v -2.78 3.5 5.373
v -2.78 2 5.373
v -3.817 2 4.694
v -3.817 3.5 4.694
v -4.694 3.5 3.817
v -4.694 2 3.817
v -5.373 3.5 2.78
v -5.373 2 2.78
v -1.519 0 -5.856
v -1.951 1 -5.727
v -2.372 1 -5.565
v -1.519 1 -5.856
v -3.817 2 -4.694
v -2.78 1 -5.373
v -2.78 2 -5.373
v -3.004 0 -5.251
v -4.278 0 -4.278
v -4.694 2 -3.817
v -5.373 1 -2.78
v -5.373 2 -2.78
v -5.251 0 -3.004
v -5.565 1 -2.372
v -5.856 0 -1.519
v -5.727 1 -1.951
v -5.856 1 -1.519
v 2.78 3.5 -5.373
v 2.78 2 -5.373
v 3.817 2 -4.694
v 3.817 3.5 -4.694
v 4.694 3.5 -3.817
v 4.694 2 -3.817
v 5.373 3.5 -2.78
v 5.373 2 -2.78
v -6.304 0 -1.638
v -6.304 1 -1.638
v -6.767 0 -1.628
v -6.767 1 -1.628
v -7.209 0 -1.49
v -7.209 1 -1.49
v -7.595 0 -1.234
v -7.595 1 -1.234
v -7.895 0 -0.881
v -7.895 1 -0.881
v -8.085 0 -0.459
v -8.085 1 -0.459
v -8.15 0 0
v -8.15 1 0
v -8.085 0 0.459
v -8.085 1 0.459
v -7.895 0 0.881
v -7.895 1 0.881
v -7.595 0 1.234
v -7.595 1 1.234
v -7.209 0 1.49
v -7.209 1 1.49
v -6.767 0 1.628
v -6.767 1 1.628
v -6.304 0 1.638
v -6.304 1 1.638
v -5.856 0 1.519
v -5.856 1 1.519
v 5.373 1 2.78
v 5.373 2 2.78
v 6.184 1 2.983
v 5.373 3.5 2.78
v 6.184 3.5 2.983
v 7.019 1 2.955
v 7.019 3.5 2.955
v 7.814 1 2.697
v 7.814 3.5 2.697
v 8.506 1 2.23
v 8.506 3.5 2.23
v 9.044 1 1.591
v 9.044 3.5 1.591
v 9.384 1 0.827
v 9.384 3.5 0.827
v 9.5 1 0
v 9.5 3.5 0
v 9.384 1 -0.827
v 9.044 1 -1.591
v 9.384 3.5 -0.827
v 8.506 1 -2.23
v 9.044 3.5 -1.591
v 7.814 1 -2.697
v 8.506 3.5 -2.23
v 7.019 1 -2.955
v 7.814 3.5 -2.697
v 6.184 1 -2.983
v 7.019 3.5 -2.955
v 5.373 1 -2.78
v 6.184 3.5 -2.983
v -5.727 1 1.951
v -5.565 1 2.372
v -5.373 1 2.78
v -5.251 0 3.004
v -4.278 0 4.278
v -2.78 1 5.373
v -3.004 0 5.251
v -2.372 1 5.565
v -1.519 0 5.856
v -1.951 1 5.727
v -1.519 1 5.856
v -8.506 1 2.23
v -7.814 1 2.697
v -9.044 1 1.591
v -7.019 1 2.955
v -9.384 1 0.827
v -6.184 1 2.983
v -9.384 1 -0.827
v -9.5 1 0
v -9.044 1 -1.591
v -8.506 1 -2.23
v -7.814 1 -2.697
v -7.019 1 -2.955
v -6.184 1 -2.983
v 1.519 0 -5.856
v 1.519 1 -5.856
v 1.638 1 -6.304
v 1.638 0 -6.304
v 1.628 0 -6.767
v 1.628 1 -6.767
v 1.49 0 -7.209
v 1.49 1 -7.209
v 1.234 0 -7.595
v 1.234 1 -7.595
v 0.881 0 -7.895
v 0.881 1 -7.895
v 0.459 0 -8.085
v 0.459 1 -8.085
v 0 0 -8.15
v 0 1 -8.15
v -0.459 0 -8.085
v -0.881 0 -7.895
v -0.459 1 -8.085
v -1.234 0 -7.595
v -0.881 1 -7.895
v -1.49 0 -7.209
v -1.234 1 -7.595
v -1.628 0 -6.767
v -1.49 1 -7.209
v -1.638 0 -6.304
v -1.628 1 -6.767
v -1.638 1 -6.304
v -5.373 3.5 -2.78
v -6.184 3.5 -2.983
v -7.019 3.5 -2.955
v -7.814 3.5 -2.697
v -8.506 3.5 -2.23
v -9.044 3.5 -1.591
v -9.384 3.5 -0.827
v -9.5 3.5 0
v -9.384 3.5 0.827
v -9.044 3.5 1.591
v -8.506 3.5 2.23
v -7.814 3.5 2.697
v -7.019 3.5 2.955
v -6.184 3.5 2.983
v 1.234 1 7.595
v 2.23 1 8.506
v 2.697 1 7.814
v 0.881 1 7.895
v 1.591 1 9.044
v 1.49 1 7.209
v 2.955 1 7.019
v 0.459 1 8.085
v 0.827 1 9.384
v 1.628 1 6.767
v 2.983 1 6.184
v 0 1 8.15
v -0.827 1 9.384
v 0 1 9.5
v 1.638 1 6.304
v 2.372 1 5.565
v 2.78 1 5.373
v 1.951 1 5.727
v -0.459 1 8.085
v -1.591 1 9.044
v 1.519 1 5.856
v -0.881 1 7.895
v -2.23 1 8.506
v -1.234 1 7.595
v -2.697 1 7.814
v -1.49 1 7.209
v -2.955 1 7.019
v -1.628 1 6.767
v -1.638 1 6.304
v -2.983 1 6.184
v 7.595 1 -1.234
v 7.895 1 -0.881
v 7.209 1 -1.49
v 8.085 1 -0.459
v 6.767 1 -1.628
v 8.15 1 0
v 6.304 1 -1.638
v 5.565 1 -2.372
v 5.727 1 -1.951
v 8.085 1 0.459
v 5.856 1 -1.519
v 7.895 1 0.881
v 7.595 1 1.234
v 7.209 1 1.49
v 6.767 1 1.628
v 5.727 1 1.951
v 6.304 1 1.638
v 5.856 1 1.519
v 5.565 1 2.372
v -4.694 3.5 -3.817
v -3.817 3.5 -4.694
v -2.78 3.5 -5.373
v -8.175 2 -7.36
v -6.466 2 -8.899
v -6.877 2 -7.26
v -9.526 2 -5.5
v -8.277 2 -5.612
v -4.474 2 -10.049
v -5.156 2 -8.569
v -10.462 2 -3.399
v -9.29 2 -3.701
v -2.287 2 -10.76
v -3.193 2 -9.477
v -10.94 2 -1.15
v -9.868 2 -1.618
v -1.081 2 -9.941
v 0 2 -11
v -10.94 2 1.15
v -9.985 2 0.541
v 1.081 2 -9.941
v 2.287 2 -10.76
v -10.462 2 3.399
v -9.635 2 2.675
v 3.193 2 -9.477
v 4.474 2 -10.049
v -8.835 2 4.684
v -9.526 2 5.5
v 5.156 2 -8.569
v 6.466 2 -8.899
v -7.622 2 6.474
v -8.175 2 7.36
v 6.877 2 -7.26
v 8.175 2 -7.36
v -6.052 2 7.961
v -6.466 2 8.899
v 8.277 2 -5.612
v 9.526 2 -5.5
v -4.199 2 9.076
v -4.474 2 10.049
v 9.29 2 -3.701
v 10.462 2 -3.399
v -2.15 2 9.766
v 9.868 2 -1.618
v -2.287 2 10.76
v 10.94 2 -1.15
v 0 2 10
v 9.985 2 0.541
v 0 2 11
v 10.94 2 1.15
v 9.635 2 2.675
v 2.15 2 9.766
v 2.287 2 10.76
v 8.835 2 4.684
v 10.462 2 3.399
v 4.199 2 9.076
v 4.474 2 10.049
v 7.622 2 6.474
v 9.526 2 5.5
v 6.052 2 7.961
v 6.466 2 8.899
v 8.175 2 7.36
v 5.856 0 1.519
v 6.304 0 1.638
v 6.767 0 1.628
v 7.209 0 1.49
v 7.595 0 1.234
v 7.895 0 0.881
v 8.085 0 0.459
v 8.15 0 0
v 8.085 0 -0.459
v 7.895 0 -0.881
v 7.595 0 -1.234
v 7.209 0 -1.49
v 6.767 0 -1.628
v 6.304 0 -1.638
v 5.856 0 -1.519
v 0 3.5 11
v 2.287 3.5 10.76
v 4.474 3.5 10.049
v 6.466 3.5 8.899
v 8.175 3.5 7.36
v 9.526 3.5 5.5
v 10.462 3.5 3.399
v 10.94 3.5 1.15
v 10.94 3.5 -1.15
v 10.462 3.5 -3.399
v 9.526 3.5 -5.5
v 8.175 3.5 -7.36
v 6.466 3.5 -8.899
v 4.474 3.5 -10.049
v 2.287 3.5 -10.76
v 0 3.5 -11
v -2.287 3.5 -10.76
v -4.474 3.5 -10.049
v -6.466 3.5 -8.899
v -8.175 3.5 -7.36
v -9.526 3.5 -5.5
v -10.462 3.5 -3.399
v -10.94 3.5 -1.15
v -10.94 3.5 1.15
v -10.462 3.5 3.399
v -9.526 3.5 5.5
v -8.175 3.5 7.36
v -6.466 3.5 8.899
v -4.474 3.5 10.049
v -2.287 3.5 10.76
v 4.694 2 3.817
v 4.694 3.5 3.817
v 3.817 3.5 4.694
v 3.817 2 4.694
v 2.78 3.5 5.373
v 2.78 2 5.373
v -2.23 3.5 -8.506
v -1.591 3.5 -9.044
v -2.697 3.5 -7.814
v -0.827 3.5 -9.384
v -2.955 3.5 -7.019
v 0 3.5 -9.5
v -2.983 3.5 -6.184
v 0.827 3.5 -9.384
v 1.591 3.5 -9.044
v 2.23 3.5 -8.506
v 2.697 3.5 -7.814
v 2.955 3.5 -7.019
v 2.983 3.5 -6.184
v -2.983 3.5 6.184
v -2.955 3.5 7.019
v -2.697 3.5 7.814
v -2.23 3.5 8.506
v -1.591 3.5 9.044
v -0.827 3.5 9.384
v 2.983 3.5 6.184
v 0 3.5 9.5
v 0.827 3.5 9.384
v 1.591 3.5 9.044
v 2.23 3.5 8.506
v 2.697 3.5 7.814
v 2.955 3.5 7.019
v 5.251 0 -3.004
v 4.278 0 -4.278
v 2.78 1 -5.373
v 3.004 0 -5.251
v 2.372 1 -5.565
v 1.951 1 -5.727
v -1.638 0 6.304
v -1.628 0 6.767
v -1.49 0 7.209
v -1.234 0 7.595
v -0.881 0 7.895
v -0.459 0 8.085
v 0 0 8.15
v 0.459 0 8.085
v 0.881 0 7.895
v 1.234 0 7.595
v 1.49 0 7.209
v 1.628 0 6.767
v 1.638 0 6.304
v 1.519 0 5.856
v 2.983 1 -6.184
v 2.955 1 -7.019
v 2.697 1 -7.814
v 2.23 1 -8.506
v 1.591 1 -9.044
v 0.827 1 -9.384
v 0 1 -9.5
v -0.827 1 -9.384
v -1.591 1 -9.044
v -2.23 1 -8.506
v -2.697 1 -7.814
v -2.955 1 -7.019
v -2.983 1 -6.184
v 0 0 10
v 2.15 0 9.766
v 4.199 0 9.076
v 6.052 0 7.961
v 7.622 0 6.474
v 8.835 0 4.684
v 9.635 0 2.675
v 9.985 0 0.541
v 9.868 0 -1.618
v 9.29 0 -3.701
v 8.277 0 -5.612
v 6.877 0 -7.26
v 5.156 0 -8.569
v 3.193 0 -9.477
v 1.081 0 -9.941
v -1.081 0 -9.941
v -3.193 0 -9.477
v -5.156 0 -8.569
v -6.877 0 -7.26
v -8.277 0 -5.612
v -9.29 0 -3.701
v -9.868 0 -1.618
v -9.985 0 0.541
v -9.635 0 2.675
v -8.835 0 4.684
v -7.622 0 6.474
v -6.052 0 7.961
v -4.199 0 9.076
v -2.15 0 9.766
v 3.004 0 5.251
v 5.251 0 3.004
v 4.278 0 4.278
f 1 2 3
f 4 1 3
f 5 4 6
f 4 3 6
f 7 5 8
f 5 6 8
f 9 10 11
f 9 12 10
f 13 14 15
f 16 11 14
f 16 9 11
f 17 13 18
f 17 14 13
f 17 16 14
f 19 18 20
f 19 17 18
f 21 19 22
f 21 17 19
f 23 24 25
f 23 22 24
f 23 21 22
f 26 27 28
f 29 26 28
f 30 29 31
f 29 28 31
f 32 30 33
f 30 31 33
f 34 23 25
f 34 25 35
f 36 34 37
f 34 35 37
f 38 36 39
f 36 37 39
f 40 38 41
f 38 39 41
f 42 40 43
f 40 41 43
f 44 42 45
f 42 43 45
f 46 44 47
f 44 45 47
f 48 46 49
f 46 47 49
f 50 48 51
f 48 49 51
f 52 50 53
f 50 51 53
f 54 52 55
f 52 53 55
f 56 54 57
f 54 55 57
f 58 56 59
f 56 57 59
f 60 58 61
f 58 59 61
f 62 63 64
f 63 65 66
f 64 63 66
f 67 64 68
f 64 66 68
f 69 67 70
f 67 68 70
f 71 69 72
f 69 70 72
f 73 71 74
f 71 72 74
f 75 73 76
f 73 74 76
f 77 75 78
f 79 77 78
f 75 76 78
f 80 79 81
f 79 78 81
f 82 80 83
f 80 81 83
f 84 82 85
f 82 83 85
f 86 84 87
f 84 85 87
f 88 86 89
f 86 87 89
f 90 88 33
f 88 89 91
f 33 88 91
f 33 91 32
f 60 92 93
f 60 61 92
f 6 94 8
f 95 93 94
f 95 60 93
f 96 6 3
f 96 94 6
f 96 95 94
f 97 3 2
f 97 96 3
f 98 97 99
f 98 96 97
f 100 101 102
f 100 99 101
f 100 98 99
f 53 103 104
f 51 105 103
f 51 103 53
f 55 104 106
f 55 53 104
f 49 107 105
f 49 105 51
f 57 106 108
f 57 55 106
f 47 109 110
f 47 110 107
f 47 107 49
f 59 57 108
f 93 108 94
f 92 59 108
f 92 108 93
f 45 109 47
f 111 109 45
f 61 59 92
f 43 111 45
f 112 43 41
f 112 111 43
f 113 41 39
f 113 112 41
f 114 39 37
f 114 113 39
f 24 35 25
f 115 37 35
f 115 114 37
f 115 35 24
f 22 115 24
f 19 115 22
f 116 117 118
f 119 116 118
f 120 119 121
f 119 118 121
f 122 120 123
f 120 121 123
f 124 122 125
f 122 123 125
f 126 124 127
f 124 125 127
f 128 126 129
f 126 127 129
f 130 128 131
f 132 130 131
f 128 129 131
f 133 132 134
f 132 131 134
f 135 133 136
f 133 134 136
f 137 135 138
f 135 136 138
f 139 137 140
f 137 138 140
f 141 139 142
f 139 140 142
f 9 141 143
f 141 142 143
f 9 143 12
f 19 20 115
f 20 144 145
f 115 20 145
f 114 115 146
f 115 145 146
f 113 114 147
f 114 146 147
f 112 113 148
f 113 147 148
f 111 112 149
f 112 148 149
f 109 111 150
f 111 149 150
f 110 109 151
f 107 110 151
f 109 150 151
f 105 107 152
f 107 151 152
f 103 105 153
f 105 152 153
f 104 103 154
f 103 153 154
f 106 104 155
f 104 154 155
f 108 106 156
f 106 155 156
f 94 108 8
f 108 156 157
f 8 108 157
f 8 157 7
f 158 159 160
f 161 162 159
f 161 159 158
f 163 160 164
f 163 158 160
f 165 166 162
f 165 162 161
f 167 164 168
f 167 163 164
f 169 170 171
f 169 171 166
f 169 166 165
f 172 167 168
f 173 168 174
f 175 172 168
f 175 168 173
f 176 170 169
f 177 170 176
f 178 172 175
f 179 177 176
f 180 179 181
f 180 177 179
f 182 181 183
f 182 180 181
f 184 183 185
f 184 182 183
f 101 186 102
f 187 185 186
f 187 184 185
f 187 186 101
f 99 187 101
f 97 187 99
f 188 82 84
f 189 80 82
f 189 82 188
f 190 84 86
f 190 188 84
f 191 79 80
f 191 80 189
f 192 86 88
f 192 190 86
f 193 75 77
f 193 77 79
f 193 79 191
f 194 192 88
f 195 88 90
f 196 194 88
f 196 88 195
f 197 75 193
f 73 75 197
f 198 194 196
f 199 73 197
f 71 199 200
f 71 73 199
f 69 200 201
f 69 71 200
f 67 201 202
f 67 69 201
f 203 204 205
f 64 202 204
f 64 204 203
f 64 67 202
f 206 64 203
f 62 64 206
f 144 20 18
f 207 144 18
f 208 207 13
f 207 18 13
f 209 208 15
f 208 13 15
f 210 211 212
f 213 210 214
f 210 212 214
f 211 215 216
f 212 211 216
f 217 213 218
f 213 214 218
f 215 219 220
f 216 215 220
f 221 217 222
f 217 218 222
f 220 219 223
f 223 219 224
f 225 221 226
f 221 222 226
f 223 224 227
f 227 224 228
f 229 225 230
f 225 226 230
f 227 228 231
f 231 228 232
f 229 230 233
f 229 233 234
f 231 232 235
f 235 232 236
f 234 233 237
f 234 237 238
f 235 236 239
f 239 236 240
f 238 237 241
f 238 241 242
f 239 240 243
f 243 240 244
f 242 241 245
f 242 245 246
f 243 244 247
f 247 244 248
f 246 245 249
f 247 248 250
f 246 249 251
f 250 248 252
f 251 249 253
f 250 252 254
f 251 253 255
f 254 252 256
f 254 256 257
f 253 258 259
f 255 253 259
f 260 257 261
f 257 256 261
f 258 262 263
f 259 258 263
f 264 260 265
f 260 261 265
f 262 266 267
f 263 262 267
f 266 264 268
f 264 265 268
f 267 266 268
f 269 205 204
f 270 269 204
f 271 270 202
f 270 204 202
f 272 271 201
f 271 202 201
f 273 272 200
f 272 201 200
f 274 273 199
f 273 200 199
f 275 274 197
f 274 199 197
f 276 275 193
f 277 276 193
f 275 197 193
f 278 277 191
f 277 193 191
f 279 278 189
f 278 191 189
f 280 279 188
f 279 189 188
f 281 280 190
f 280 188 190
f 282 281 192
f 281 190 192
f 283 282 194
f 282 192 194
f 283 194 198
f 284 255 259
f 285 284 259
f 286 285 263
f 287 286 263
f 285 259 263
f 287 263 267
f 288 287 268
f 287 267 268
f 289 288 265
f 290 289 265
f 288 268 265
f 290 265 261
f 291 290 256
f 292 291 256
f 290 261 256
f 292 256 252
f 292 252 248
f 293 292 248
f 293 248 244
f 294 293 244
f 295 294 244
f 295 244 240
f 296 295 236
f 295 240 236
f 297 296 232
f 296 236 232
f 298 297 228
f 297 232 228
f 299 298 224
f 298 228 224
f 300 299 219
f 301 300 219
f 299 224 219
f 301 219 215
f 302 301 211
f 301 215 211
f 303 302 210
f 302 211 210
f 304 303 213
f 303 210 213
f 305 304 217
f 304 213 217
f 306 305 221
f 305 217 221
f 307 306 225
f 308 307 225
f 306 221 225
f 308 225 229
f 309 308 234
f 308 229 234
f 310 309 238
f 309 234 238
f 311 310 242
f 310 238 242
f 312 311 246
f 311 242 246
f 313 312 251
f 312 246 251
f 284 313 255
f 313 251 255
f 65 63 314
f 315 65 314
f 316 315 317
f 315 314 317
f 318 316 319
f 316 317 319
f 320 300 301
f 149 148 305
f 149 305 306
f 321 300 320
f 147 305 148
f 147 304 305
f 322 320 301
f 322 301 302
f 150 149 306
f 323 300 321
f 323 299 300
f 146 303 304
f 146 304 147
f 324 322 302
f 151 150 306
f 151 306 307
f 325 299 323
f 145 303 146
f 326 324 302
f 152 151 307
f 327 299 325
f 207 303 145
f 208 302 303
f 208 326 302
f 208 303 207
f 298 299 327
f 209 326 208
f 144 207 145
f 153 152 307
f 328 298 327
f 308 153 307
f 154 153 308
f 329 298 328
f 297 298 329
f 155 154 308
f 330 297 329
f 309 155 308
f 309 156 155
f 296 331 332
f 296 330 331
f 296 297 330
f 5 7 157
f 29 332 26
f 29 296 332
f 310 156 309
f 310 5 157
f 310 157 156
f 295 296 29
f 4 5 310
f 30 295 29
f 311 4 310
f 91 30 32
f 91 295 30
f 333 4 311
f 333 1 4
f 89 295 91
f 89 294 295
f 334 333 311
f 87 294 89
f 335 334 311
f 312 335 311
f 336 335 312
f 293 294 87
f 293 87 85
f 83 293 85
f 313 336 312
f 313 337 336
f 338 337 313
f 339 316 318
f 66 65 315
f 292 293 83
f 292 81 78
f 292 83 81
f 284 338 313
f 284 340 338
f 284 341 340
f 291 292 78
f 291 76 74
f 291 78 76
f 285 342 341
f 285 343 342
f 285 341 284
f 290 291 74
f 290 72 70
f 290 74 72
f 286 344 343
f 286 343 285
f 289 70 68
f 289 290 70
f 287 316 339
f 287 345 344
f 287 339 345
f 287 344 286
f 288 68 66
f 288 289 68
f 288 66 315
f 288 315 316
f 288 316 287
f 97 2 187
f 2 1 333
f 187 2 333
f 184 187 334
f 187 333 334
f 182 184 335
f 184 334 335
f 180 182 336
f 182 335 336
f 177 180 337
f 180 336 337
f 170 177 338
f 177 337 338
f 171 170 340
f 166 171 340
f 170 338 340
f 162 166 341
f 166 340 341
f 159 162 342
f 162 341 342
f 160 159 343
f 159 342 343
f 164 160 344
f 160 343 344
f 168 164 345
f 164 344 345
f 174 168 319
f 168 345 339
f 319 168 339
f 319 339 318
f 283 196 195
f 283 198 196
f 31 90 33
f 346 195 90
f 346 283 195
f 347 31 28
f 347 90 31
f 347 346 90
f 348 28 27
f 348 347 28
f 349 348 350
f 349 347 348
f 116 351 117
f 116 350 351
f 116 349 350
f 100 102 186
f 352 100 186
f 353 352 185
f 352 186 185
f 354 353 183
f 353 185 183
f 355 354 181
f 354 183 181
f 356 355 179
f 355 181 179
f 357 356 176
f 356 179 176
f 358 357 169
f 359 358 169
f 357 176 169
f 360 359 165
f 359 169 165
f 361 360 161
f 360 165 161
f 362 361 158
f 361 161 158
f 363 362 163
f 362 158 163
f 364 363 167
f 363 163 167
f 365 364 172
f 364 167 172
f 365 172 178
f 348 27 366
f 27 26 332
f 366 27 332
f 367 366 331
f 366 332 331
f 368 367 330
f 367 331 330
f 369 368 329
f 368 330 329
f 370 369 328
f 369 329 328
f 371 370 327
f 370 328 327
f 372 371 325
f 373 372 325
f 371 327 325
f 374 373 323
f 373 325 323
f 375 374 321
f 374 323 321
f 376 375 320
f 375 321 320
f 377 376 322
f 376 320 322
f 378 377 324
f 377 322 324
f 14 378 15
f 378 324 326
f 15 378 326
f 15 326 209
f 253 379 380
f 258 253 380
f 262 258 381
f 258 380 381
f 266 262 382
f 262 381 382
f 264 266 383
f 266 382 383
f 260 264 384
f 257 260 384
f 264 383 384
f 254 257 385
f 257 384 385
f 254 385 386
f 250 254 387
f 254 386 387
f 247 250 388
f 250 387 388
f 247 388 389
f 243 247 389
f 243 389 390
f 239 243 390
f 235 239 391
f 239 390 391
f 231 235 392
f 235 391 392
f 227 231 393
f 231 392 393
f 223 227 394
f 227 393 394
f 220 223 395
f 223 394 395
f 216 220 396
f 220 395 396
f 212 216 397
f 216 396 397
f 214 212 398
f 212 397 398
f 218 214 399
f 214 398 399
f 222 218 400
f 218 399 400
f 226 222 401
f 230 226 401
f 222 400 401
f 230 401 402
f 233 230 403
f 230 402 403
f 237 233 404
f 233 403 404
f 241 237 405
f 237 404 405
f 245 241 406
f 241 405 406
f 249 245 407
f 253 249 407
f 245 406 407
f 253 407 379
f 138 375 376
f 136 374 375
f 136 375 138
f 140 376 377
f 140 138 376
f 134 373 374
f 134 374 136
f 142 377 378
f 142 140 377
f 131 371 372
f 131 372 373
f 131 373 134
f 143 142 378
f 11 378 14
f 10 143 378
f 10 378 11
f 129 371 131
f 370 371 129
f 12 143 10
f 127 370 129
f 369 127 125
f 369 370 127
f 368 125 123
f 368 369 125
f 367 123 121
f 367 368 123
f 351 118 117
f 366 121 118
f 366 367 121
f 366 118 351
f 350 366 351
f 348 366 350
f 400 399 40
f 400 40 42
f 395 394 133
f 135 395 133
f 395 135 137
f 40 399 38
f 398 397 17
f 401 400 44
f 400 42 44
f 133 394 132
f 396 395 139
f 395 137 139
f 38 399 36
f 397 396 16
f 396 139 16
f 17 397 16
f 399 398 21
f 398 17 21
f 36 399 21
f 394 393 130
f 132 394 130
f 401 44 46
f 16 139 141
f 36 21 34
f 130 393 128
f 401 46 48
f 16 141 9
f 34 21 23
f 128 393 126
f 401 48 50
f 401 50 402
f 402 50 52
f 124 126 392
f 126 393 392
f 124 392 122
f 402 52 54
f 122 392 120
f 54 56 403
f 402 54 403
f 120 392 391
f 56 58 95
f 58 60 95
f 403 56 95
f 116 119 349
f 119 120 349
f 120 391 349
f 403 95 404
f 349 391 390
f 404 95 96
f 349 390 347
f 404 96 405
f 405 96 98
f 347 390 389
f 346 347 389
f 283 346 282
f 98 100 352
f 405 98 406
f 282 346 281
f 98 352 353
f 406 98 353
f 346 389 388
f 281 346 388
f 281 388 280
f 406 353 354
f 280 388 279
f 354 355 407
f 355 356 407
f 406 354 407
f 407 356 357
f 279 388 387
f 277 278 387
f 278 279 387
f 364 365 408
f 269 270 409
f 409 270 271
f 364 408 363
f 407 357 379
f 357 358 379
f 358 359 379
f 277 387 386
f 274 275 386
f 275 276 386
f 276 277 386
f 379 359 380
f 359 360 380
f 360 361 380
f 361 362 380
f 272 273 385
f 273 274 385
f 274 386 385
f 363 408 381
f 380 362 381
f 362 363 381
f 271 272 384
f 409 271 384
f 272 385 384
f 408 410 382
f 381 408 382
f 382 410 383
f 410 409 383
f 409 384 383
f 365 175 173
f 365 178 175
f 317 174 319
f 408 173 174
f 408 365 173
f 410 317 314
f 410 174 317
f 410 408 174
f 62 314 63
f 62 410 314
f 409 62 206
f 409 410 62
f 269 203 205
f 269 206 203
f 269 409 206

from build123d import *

# Parameters (mm, degrees)
SKETCH_1_R               = 10
SKETCH_1_R_2             = 6.05
EXTRUDE_1_DEPTH          = 2
SKETCH_2_R               = 1.65
CUT_EXTRUDE_1_DEPTH      = 2
PATTERN_CIRCULAR_1_COUNT = 4
SKETCH_3_R               = 11
SKETCH_3_R_2             = 10
EXTRUDE_2_DEPTH          = 1.5
SKETCH_4_R               = 3
CUT_EXTRUDE_2_DEPTH      = 2.5
PATTERN_CIRCULAR_2_COUNT = 4


with BuildPart() as part:
    # 草图1 → 凸台-拉伸1 (new body)
    with BuildSketch(Plane(origin=(0, 0, 0), x_dir=(1, 0, 0), z_dir=(0, 1, 0))):
        with Locations(Location((0, 0, 0), (0, 0, 270))):
            Circle(SKETCH_1_R)
        with Locations(Location((0, 0, 0), (0, 0, 270))):
            Circle(SKETCH_1_R_2, mode=Mode.SUBTRACT)
    extrude(amount=EXTRUDE_1_DEPTH)

    # 草图2 → 切除-拉伸1 (cut)
    with BuildSketch(Plane(origin=(0, 2, 0), x_dir=(1, 0, 0), z_dir=(0, 1, 0))):
        with Locations((-6.5, 0)):
            Circle(SKETCH_2_R)
    cut_extrude_1 = extrude(amount=-CUT_EXTRUDE_1_DEPTH, mode=Mode.SUBTRACT)

    # 阵列(圆周)1: 切除-拉伸1 ×4 about axis
    pattern_circular_1_axis = Axis((0, 0, 0), (0, 1, 0))
    for i in range(1, PATTERN_CIRCULAR_1_COUNT):
        add(cut_extrude_1.rotate(pattern_circular_1_axis, i * 360 / PATTERN_CIRCULAR_1_COUNT), mode=Mode.SUBTRACT)

    # 草图3 → 凸台-拉伸2 (add)
    # profile 1 of 2: a face of its own
    with BuildSketch(Plane(origin=(0, 2, 0), x_dir=(1, 0, 0), z_dir=(0, 1, 0))):
        with Locations(Location((0, 0, 0), (0, 0, 270))):
            Circle(SKETCH_3_R)
        with Locations(Location((0, 0, 0), (0, 0, 270))):
            Circle(SKETCH_3_R_2, mode=Mode.SUBTRACT)
    # profile 2 of 2: a face of its own
    with BuildSketch(Plane(origin=(0, 2, 0), x_dir=(1, 0, 0), z_dir=(0, 1, 0))):
        with Locations(Location((0, 0, 0), (0, 0, 270))):
            Circle(SKETCH_3_R_2)
        with BuildLine():
            ThreePointArc((5.856153846, -1.519197857), (4.277996026, -4.277996026), (1.519197857, -5.856153846))
            ThreePointArc((1.519197857, -5.856153846), (0, -8.15), (-1.519197857, -5.856153846))
            ThreePointArc((-1.519197857, -5.856153846), (-4.277996026, -4.277996026), (-5.856153846, -1.519197857))
            ThreePointArc((-5.856153846, -1.519197857), (-8.15, 0), (-5.856153846, 1.519197857))
            ThreePointArc((-5.856153846, 1.519197857), (-4.277996026, 4.277996026), (-1.519197857, 5.856153846))
            ThreePointArc((-1.519197857, 5.856153846), (0, 8.15), (1.519197857, 5.856153846))
            ThreePointArc((1.519197857, 5.856153846), (4.277996026, 4.277996026), (5.856153846, 1.519197857))
            ThreePointArc((5.856153846, 1.519197857), (8.15, 0), (5.856153846, -1.519197857))
        make_face(mode=Mode.SUBTRACT)
    extrude(amount=EXTRUDE_2_DEPTH)

    # 草图4 → 切除-拉伸2 (cut)
    with BuildSketch(Plane(origin=(0, 3.5, 0), x_dir=(1, 0, 0), z_dir=(0, 1, 0))):
        with Locations((-6.5, 0)):
            Circle(SKETCH_4_R)
    cut_extrude_2 = extrude(amount=-CUT_EXTRUDE_2_DEPTH, mode=Mode.SUBTRACT)

    # 阵列(圆周)2: 切除-拉伸2 ×4 about axis
    pattern_circular_2_axis = Axis((0, 0, 0), (0, 1, 0))
    for i in range(1, PATTERN_CIRCULAR_2_COUNT):
        add(cut_extrude_2.rotate(pattern_circular_2_axis, i * 360 / PATTERN_CIRCULAR_2_COUNT), mode=Mode.SUBTRACT)


solid = part.part
